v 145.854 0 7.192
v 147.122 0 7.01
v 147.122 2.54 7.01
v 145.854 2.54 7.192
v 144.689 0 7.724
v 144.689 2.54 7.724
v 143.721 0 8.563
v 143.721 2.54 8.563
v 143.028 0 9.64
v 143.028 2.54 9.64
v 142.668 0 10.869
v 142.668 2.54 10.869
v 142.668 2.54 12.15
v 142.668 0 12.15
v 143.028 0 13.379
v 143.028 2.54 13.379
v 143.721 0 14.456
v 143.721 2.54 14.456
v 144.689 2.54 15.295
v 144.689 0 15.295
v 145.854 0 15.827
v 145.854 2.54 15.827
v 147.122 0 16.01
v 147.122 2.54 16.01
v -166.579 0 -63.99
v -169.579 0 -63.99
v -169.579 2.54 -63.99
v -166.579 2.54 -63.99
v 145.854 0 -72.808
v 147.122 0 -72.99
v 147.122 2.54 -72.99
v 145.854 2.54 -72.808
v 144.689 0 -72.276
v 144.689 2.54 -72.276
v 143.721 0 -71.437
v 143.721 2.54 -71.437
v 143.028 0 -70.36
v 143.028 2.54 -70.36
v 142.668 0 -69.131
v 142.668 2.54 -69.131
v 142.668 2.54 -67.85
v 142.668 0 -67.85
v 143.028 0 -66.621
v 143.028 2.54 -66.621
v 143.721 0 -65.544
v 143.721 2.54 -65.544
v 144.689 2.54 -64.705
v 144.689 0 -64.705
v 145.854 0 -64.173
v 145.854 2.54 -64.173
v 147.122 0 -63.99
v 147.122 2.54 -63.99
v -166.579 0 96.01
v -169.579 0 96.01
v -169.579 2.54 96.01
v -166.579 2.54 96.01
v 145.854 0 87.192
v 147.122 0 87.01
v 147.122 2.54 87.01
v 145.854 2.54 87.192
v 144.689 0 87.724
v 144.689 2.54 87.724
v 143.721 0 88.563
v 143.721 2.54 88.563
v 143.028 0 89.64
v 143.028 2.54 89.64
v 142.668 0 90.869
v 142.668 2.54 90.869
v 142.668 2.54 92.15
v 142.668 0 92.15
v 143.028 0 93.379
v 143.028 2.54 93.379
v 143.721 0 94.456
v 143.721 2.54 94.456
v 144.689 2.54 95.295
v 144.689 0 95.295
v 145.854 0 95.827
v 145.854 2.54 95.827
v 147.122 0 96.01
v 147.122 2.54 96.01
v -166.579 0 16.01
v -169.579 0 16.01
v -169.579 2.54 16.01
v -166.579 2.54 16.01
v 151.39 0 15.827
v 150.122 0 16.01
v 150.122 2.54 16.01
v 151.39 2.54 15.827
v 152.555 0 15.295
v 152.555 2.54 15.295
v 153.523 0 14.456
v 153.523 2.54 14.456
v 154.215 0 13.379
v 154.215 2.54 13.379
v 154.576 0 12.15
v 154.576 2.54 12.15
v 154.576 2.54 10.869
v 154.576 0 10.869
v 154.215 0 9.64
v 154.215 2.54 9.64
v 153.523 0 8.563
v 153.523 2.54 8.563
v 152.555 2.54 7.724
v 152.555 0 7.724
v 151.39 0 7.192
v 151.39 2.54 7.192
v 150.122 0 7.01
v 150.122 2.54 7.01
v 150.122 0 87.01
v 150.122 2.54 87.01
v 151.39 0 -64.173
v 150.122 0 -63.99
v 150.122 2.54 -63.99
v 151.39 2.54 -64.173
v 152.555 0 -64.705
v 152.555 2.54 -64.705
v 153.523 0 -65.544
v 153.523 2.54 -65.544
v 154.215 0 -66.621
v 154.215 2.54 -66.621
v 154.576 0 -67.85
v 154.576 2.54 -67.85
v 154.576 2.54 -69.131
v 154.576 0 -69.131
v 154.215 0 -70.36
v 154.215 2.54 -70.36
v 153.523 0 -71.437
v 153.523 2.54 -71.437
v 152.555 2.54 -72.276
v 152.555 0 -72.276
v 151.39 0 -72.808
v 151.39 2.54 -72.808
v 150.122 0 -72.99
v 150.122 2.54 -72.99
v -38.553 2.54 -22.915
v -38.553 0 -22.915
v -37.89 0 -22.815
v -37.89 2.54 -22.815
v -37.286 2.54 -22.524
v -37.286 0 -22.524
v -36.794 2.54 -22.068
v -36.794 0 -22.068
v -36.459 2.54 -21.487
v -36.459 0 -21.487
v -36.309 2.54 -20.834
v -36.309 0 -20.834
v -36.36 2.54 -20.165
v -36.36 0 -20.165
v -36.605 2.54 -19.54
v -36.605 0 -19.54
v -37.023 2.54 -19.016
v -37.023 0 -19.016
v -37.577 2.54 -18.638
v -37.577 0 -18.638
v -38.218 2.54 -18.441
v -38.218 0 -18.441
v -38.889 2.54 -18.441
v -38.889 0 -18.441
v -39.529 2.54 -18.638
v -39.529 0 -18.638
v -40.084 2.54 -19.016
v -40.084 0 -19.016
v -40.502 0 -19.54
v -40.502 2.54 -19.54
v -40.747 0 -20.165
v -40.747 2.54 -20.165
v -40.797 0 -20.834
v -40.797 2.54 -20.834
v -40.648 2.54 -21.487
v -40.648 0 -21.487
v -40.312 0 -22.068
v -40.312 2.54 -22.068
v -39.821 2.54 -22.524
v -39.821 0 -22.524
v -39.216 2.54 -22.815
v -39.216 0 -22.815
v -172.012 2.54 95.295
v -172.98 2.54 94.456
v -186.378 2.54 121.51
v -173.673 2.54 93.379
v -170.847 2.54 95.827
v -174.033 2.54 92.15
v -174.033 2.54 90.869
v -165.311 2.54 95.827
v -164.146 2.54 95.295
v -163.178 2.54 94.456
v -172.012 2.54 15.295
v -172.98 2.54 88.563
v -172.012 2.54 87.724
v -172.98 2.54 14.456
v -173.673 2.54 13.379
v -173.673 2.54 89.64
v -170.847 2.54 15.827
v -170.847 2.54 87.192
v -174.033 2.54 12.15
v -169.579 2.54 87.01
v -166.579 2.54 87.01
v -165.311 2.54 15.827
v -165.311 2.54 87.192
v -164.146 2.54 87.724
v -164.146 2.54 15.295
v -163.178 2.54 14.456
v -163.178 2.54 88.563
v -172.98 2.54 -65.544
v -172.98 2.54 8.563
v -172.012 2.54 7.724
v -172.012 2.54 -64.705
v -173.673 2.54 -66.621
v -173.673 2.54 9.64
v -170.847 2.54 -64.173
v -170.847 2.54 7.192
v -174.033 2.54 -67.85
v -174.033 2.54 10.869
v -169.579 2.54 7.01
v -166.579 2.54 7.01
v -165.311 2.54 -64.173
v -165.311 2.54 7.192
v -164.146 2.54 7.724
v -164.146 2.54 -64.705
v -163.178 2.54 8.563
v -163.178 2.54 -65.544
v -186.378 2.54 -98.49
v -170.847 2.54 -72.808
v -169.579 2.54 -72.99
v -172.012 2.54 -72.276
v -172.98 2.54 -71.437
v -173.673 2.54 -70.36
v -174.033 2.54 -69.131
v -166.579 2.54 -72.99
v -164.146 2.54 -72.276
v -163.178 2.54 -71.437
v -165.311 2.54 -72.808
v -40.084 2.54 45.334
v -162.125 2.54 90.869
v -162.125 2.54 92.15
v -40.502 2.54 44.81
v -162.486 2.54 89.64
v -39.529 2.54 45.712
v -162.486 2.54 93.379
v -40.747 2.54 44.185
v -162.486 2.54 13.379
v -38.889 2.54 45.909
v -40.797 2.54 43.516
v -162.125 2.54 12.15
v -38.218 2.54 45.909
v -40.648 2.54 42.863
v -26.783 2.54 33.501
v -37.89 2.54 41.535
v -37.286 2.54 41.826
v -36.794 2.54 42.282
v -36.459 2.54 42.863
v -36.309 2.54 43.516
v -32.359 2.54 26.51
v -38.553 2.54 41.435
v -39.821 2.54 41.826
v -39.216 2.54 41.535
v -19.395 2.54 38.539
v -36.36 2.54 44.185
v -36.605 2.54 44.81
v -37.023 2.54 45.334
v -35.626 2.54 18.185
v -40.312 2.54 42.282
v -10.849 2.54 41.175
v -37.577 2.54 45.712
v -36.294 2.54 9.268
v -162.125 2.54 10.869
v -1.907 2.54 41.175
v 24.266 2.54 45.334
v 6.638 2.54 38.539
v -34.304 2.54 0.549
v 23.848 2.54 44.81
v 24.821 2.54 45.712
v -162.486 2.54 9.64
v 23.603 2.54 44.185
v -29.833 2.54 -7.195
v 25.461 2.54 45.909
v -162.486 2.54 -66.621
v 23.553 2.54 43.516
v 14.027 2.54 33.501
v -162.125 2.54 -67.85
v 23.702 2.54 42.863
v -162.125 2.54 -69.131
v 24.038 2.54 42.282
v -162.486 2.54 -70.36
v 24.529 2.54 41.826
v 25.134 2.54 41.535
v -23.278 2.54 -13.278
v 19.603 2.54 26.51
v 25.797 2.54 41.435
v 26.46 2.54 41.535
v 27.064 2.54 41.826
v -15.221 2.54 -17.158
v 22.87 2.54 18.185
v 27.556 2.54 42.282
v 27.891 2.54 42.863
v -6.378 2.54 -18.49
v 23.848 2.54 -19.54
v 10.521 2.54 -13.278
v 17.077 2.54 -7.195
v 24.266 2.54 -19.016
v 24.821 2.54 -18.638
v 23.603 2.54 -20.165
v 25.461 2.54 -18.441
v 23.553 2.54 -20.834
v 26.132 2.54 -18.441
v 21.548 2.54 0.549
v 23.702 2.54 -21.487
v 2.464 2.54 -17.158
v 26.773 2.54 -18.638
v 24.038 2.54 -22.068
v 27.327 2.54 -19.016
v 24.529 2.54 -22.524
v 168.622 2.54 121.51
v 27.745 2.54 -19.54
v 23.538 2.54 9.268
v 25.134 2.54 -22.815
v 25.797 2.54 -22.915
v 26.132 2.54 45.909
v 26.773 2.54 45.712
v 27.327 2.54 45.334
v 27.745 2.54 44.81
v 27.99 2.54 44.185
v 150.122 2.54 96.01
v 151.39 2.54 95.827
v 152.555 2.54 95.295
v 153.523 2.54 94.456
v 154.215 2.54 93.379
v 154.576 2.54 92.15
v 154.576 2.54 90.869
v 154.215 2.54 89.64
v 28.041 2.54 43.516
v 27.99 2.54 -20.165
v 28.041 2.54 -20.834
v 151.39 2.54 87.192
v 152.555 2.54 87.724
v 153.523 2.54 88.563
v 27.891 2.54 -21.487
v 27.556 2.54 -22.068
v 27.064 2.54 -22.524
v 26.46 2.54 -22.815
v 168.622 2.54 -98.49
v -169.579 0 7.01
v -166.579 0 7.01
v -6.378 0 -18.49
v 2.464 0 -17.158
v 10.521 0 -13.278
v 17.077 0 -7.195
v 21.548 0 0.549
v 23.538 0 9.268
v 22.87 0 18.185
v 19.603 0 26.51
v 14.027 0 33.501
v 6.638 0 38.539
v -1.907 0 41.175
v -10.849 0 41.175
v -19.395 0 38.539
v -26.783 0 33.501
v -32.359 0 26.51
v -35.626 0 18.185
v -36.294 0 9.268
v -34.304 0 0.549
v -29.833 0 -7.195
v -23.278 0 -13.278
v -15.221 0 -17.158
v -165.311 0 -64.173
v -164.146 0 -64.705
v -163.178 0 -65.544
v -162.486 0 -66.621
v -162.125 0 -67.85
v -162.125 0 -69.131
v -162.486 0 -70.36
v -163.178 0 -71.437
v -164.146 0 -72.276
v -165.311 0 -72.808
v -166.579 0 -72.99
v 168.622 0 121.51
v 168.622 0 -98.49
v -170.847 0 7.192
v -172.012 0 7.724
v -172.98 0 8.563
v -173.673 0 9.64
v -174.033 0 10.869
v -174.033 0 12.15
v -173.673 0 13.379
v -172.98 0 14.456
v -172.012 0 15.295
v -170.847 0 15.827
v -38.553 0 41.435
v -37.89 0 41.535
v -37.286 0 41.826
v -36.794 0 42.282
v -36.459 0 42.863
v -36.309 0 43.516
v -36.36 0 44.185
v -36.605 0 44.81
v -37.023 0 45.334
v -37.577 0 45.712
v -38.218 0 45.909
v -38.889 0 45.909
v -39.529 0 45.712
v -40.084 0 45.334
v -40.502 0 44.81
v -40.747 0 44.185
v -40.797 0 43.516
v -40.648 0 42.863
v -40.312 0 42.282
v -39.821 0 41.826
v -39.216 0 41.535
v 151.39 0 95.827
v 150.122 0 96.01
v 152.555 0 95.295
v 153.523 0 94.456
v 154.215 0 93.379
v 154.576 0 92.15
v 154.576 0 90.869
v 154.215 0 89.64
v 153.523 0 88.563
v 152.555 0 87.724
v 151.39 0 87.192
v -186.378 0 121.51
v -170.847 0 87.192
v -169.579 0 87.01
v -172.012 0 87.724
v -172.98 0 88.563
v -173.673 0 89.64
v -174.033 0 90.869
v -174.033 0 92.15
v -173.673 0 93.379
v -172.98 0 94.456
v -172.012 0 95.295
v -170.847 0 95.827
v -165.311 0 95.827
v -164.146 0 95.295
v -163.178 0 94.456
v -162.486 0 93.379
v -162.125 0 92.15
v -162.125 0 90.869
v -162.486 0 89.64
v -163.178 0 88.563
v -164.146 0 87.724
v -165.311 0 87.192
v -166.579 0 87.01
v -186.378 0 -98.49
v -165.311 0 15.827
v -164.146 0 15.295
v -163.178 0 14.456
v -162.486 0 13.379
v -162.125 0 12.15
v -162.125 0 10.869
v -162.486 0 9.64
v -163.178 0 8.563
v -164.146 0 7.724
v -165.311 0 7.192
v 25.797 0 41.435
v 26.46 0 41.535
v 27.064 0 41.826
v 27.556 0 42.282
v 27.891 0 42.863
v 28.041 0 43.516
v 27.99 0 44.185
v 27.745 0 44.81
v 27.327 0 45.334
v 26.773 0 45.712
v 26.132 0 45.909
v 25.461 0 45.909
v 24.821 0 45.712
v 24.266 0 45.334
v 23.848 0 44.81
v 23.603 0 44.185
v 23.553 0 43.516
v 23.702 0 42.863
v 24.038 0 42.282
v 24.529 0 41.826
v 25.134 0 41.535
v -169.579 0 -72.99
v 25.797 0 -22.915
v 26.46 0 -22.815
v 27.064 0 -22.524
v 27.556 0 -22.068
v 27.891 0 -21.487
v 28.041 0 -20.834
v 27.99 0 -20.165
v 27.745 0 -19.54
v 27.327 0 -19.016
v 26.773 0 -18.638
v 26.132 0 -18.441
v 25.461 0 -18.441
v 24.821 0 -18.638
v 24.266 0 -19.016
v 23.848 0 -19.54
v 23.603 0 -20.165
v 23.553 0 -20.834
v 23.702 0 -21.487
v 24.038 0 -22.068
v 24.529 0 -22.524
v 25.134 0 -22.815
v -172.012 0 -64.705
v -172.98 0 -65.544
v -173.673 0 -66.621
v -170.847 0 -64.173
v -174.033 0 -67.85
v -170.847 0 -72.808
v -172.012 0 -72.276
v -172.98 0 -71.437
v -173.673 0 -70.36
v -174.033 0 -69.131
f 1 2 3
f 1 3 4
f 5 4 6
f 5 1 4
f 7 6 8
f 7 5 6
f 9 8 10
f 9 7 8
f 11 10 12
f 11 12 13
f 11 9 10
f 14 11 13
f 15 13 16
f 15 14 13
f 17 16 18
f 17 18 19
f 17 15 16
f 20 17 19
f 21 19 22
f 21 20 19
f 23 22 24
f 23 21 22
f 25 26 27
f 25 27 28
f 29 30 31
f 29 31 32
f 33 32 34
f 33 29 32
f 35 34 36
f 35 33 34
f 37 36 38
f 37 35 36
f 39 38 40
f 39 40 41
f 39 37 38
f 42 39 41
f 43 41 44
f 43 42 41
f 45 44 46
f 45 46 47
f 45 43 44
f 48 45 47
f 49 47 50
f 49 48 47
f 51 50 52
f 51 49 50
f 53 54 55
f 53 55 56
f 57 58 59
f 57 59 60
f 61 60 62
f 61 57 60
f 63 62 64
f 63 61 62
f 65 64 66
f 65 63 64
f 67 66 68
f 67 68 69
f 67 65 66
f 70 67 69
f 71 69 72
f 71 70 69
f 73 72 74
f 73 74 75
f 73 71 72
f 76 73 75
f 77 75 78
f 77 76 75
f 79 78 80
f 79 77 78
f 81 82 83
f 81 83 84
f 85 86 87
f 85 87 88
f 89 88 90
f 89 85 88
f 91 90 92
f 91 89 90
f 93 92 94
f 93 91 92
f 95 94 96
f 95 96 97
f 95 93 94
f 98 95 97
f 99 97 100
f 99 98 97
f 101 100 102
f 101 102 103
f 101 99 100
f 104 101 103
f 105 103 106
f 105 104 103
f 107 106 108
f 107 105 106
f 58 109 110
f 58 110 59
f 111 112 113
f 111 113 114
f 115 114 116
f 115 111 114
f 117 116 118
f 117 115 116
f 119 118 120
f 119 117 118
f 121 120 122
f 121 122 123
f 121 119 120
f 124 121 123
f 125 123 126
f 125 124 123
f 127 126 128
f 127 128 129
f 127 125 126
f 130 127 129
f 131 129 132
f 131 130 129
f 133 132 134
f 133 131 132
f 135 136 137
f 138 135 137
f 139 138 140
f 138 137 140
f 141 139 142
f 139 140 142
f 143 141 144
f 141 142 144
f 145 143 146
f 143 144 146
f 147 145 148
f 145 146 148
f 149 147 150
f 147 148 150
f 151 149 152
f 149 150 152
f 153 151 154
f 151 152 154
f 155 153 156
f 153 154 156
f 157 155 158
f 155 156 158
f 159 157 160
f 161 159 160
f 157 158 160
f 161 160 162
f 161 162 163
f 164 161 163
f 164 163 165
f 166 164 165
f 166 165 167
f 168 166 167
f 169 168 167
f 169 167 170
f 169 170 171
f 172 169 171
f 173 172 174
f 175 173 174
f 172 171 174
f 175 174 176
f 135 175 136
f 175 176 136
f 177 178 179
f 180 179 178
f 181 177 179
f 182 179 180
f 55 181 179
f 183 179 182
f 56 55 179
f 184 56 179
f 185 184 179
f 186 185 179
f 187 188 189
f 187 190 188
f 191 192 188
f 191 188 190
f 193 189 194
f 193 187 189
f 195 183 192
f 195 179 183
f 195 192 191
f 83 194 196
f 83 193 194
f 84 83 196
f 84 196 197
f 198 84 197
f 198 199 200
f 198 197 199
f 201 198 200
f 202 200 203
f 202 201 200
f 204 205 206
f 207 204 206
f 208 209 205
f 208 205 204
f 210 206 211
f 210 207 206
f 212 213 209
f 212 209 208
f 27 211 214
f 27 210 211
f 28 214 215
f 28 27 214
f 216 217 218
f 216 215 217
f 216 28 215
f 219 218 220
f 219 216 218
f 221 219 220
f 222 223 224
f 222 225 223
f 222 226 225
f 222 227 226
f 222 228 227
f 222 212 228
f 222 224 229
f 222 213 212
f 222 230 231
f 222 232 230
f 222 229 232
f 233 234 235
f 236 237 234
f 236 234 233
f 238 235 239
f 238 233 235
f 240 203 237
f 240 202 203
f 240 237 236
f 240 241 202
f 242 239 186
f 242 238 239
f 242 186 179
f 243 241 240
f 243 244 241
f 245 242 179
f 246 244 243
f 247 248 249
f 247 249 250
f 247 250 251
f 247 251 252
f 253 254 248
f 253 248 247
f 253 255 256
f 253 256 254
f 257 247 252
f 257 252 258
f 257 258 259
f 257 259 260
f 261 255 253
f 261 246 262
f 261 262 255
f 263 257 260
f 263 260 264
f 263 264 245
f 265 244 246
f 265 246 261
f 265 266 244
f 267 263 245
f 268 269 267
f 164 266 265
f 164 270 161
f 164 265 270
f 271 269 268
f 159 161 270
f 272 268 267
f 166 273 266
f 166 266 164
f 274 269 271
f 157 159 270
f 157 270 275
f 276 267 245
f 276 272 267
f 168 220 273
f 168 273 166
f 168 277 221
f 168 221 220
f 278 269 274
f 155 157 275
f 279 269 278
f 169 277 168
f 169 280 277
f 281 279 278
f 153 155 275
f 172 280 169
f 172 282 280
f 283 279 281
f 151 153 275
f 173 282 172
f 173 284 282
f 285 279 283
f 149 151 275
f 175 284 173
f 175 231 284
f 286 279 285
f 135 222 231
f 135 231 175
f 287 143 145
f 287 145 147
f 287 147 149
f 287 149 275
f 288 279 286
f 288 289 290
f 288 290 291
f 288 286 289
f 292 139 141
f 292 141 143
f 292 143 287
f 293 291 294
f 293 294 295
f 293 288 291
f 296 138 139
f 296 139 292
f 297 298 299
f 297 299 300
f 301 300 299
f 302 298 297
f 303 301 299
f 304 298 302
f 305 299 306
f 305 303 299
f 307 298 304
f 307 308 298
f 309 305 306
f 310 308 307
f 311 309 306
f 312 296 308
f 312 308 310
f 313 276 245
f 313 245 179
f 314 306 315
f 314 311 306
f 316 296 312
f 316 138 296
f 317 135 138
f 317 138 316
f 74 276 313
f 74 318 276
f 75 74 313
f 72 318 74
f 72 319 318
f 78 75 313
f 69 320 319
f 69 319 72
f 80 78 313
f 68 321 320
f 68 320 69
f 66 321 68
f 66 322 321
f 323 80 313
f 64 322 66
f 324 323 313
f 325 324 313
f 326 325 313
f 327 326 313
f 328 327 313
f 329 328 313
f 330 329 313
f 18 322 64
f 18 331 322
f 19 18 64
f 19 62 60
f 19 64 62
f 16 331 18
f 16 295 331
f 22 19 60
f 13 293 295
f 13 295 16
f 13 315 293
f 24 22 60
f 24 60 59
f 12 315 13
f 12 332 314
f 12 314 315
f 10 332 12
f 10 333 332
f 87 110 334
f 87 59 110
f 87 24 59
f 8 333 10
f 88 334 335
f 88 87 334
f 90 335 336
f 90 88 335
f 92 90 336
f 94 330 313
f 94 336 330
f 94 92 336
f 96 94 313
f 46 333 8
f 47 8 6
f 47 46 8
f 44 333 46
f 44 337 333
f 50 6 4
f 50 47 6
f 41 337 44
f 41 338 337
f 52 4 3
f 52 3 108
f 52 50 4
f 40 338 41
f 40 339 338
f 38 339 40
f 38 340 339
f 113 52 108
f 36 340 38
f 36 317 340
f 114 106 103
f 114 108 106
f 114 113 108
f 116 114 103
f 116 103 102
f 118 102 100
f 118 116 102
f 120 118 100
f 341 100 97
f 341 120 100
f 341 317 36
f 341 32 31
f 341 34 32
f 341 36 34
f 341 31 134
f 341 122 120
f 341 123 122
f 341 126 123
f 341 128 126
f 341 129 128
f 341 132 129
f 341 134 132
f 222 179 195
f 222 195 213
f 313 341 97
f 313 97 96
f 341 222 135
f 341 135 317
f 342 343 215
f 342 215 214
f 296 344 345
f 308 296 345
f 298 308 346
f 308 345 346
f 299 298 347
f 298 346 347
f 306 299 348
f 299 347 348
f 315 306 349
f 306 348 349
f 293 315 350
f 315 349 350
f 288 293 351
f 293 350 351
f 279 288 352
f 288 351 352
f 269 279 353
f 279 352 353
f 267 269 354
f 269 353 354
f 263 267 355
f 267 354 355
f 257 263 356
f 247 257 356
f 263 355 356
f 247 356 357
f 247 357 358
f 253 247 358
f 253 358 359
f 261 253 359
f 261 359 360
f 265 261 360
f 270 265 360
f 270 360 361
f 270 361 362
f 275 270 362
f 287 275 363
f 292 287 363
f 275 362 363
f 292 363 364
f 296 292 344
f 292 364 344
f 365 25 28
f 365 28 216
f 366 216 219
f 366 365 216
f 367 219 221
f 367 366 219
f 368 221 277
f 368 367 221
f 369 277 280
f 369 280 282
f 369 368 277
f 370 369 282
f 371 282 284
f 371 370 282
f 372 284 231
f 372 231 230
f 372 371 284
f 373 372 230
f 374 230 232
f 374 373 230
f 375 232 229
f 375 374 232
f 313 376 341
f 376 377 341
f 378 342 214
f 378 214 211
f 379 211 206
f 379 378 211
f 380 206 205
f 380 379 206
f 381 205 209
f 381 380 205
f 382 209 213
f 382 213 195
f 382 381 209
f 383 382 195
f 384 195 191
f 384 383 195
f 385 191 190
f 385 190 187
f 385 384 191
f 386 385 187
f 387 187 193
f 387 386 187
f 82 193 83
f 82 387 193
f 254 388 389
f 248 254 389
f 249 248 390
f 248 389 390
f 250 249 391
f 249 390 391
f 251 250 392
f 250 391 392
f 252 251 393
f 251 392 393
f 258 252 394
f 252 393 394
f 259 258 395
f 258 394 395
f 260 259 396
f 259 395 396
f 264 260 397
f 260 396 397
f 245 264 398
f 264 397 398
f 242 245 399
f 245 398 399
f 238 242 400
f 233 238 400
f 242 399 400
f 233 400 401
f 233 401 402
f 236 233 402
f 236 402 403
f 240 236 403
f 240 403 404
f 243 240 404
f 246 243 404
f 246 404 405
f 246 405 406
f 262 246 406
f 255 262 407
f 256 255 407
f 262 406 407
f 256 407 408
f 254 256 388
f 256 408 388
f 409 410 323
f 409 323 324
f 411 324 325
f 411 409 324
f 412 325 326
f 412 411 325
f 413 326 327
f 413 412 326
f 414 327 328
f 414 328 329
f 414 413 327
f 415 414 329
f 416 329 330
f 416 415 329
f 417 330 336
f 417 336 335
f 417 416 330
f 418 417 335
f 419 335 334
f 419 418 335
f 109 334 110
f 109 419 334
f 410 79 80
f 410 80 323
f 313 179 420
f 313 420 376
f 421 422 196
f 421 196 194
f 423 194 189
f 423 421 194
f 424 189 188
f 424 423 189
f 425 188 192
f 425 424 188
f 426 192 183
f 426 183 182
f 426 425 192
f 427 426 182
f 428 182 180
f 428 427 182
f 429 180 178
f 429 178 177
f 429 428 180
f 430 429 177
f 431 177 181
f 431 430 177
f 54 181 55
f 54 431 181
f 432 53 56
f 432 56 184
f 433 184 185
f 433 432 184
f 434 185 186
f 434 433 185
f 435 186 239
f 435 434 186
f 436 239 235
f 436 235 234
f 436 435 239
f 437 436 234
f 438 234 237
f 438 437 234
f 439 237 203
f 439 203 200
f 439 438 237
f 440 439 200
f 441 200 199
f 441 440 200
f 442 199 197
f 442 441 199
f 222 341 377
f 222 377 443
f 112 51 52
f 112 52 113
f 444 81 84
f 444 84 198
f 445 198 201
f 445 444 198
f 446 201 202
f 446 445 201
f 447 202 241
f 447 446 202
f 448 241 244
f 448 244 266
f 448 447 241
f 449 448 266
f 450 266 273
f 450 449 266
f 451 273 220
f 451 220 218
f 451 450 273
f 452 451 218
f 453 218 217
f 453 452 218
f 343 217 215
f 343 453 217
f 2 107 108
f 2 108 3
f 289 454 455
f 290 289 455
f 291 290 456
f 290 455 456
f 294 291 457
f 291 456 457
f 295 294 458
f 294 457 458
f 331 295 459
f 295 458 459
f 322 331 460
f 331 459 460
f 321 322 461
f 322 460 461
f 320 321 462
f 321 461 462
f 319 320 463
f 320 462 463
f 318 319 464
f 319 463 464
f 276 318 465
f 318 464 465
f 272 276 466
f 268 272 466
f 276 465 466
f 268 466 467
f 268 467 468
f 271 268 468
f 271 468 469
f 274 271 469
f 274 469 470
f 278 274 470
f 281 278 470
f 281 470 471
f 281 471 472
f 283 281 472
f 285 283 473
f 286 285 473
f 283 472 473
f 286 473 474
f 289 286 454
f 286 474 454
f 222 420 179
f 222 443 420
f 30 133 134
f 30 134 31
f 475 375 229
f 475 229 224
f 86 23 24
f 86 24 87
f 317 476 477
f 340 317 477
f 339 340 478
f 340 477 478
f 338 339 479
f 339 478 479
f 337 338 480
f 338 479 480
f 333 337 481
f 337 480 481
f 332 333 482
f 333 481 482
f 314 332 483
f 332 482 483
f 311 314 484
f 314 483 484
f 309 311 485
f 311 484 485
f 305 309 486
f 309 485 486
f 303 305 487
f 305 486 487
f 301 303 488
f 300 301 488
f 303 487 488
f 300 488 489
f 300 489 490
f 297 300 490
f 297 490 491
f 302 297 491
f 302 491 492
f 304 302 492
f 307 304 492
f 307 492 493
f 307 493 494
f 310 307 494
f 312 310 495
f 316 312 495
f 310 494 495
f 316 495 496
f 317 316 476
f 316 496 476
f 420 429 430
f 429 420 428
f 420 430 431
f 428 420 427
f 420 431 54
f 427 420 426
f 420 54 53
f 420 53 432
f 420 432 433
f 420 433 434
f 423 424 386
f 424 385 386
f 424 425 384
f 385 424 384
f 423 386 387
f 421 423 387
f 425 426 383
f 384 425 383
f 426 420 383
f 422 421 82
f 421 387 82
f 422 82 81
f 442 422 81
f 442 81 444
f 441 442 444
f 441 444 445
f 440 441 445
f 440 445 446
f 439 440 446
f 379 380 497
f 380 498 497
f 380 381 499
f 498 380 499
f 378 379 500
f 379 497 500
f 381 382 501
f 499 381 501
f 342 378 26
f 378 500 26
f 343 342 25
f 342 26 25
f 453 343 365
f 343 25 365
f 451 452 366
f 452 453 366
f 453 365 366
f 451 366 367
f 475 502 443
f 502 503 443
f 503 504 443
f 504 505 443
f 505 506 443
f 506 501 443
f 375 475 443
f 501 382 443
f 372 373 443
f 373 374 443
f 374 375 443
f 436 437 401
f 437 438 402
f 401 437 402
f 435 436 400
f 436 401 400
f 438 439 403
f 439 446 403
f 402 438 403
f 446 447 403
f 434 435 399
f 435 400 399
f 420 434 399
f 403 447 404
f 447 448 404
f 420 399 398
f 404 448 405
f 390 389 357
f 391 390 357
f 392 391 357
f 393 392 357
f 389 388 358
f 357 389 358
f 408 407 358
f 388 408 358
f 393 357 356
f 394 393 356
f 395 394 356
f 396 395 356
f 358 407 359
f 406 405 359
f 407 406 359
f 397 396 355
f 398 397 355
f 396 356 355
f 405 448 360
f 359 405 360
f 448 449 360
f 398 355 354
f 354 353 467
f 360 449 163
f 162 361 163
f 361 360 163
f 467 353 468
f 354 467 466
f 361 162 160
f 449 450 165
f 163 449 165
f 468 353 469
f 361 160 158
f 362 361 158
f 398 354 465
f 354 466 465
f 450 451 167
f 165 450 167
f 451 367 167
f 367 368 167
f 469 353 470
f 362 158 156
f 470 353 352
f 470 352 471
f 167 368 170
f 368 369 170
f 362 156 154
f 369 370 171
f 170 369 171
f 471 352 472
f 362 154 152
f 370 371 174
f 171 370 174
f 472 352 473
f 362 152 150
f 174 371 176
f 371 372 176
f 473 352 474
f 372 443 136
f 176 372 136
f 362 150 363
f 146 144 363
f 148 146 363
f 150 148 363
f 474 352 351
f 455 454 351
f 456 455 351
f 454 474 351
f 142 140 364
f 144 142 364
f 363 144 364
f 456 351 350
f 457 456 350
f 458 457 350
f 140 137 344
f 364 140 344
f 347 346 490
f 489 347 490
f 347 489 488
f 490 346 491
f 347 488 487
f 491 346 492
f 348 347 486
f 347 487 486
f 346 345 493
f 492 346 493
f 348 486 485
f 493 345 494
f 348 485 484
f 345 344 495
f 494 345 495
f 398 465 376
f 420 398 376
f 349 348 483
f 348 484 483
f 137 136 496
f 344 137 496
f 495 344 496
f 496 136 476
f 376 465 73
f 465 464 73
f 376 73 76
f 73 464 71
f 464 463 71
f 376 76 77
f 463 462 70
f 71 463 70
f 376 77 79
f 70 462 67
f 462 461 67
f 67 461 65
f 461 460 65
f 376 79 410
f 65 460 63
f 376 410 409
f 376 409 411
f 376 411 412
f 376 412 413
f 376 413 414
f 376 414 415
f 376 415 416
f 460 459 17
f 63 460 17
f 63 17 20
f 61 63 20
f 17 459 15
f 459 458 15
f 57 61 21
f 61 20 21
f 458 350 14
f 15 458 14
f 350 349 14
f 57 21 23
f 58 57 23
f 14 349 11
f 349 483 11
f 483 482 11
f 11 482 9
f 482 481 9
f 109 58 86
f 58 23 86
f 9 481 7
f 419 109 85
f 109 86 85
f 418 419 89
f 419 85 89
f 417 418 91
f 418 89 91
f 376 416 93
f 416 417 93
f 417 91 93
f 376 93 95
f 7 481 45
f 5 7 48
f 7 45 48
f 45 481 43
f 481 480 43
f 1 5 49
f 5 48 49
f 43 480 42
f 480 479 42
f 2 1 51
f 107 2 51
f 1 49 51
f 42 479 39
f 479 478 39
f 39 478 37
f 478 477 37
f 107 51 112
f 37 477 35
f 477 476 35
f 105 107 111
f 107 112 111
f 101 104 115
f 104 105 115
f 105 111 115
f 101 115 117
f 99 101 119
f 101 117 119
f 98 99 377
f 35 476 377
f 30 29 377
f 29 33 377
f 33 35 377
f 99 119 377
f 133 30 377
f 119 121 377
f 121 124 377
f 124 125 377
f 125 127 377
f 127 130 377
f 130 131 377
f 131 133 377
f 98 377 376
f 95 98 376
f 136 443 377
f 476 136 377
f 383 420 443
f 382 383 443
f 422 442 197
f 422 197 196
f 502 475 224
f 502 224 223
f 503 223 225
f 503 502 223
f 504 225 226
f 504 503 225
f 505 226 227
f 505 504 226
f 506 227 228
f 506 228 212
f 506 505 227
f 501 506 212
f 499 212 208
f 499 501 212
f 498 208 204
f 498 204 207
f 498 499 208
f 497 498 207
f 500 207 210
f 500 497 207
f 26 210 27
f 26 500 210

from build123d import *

# Parameters (mm, degrees)
SKETCH1_W                = 355
SKETCH1_H                = 100
BOSS_EXTRUDE1_DEPTH      = 2.54
SKETCH4_R                = 2.25
SKETCH4_R_2              = 30
CUT_EXTRUDE1_DEPTH       = 2.54
SKETCH5_W                = 100
SKETCH5_H                = 2.54
BOSS_EXTRUDE2_DEPTH      = 2.5
SKETCH6_W                = 100
SKETCH6_H                = 2.54
CUT_EXTRUDE2_DEPTH       = 2.5
SKETCH7_W                = 355
SKETCH7_H                = 2.54
BOSS_EXTRUDE3_DEPTH      = 60
SKETCH8_W                = 355
SKETCH8_H                = 2.54
BOSS_EXTRUDE4_DEPTH      = 60
M8_CLEARANCE_SLOT6_DEPTH = 2.54


# Read off the part's stored shape, not the designer's step: M8 Clearance Slot6
with BuildPart() as part:
    # Sketch1 → Boss-Extrude1 (new body)
    with BuildSketch(Plane(origin=(0, 0, 0), x_dir=(1, 0, 0), z_dir=(0, 1, 0))):
        with Locations((-6.378176495, -11.509617782)):
            Rectangle(SKETCH1_W, SKETCH1_H)
    extrude(amount=BOSS_EXTRUDE1_DEPTH)

    # Sketch4 → Cut-Extrude1 (cut)
    with BuildSketch(Plane(origin=(0, 0, 0), x_dir=(-1, 0, 0), z_dir=(0, -1, 0))):
        with Locations(Location((38.553176495, 20.665382218, 0), (0, 0, 90))):
            Circle(SKETCH4_R)
        with Locations(Location((-25.796823505, 20.665382218, 0), (0, 0, 90))):
            Circle(SKETCH4_R)
        with Locations(Location((-25.796823505, -43.684617782, 0), (0, 0, 90))):
            Circle(SKETCH4_R)
        with Locations(Location((38.553176495, -43.684617782, 0), (0, 0, 90))):
            Circle(SKETCH4_R)
        with Locations(Location((6.378176495, -11.509617782, 0), (0, 0, 90))):
            Circle(SKETCH4_R_2)
    extrude(amount=-CUT_EXTRUDE1_DEPTH, mode=Mode.SUBTRACT)

    # Sketch5 → Boss-Extrude2 (add)
    with BuildSketch(Plane.ZY.offset(183.878176495)):
        with Locations((11.509617782, 1.27)):
            Rectangle(SKETCH5_W, SKETCH5_H)
    extrude(amount=BOSS_EXTRUDE2_DEPTH)

    # Sketch6 → Cut-Extrude2 (cut)
    with BuildSketch(Plane(origin=(171.121823505, 0, 0), x_dir=(0, 0, -1), z_dir=(1, 0, 0))):
        with Locations((-11.509617782, 1.27)):
            Rectangle(SKETCH6_W, SKETCH6_H)
    extrude(amount=-CUT_EXTRUDE2_DEPTH, mode=Mode.SUBTRACT)

    # Sketch7 → Boss-Extrude3 (add)
    with BuildSketch(Plane(origin=(0, 0, -38.490382218), x_dir=(-1, 0, 0), z_dir=(0, 0, -1))):
        with Locations((8.878176495, 1.27)):
            Rectangle(SKETCH7_W, SKETCH7_H)
    extrude(amount=BOSS_EXTRUDE3_DEPTH)

    # Sketch8 → Boss-Extrude4 (add)
    with BuildSketch(Plane.XY.offset(61.509617782)):
        with Locations((-8.878176495, 1.27)):
            Rectangle(SKETCH8_W, SKETCH8_H)
    extrude(amount=BOSS_EXTRUDE4_DEPTH)

    # M8 Clearance Slot6 outline → M8 Clearance Slot6 (cut)
    with BuildSketch(Plane(origin=(0, 0, 0), x_dir=(1, 0, 0), z_dir=(0, 1, 0))):
        with BuildLine():
            Line((-169.579279891, 63.990382218), (-166.579279891, 63.990382218))
            ThreePointArc((-166.579279891, 63.990382218), (-162.079279891, 68.490382218), (-166.579279891, 72.990382218))
            Line((-166.579279891, 72.990382218), (-169.579279891, 72.990382218))
            ThreePointArc((-169.579279891, 72.990382218), (-174.079279891, 68.490382218), (-169.579279891, 63.990382218))
        make_face()
        with BuildLine():
            ThreePointArc((147.121823505, 72.990382218), (142.621823505, 68.490382218), (147.121823505, 63.990382218))
            Line((147.121823505, 63.990382218), (150.121823505, 63.990382218))
            ThreePointArc((150.121823505, 63.990382218), (154.621823505, 68.490382218), (150.121823505, 72.990382218))
            Line((150.121823505, 72.990382218), (147.121823505, 72.990382218))
        make_face()
        with BuildLine():
            Line((-169.579279891, -96.009617782), (-166.579279891, -96.009617782))
            ThreePointArc((-166.579279891, -96.009617782), (-162.079279891, -91.509617782), (-166.579279891, -87.009617782))
            Line((-166.579279891, -87.009617782), (-169.579279891, -87.009617782))
            ThreePointArc((-169.579279891, -87.009617782), (-174.079279891, -91.509617782), (-169.579279891, -96.009617782))
        make_face()
        with BuildLine():
            ThreePointArc((150.121823505, -96.009617782), (154.621823505, -91.509617782), (150.121823505, -87.009617782))
            Line((150.121823505, -87.009617782), (147.121823505, -87.009617782))
            ThreePointArc((147.121823505, -87.009617782), (142.621823505, -91.509617782), (147.121823505, -96.009617782))
            Line((147.121823505, -96.009617782), (150.121823505, -96.009617782))
        make_face()
        with BuildLine():
            ThreePointArc((-166.579279891, -16.009617782), (-162.079279891, -11.509617782), (-166.579279891, -7.009617782))
            Line((-166.579279891, -7.009617782), (-169.579279891, -7.009617782))
            ThreePointArc((-169.579279891, -7.009617782), (-174.079279891, -11.509617782), (-169.579279891, -16.009617782))
            Line((-169.579279891, -16.009617782), (-166.579279891, -16.009617782))
        make_face()
        with BuildLine():
            ThreePointArc((150.121823505, -16.009617782), (154.621823505, -11.509617782), (150.121823505, -7.009617782))
            Line((150.121823505, -7.009617782), (147.121823505, -7.009617782))
            ThreePointArc((147.121823505, -7.009617782), (142.621823505, -11.509617782), (147.121823505, -16.009617782))
            Line((147.121823505, -16.009617782), (150.121823505, -16.009617782))
        make_face()
    extrude(amount=M8_CLEARANCE_SLOT6_DEPTH, mode=Mode.SUBTRACT)


solid = part.part
